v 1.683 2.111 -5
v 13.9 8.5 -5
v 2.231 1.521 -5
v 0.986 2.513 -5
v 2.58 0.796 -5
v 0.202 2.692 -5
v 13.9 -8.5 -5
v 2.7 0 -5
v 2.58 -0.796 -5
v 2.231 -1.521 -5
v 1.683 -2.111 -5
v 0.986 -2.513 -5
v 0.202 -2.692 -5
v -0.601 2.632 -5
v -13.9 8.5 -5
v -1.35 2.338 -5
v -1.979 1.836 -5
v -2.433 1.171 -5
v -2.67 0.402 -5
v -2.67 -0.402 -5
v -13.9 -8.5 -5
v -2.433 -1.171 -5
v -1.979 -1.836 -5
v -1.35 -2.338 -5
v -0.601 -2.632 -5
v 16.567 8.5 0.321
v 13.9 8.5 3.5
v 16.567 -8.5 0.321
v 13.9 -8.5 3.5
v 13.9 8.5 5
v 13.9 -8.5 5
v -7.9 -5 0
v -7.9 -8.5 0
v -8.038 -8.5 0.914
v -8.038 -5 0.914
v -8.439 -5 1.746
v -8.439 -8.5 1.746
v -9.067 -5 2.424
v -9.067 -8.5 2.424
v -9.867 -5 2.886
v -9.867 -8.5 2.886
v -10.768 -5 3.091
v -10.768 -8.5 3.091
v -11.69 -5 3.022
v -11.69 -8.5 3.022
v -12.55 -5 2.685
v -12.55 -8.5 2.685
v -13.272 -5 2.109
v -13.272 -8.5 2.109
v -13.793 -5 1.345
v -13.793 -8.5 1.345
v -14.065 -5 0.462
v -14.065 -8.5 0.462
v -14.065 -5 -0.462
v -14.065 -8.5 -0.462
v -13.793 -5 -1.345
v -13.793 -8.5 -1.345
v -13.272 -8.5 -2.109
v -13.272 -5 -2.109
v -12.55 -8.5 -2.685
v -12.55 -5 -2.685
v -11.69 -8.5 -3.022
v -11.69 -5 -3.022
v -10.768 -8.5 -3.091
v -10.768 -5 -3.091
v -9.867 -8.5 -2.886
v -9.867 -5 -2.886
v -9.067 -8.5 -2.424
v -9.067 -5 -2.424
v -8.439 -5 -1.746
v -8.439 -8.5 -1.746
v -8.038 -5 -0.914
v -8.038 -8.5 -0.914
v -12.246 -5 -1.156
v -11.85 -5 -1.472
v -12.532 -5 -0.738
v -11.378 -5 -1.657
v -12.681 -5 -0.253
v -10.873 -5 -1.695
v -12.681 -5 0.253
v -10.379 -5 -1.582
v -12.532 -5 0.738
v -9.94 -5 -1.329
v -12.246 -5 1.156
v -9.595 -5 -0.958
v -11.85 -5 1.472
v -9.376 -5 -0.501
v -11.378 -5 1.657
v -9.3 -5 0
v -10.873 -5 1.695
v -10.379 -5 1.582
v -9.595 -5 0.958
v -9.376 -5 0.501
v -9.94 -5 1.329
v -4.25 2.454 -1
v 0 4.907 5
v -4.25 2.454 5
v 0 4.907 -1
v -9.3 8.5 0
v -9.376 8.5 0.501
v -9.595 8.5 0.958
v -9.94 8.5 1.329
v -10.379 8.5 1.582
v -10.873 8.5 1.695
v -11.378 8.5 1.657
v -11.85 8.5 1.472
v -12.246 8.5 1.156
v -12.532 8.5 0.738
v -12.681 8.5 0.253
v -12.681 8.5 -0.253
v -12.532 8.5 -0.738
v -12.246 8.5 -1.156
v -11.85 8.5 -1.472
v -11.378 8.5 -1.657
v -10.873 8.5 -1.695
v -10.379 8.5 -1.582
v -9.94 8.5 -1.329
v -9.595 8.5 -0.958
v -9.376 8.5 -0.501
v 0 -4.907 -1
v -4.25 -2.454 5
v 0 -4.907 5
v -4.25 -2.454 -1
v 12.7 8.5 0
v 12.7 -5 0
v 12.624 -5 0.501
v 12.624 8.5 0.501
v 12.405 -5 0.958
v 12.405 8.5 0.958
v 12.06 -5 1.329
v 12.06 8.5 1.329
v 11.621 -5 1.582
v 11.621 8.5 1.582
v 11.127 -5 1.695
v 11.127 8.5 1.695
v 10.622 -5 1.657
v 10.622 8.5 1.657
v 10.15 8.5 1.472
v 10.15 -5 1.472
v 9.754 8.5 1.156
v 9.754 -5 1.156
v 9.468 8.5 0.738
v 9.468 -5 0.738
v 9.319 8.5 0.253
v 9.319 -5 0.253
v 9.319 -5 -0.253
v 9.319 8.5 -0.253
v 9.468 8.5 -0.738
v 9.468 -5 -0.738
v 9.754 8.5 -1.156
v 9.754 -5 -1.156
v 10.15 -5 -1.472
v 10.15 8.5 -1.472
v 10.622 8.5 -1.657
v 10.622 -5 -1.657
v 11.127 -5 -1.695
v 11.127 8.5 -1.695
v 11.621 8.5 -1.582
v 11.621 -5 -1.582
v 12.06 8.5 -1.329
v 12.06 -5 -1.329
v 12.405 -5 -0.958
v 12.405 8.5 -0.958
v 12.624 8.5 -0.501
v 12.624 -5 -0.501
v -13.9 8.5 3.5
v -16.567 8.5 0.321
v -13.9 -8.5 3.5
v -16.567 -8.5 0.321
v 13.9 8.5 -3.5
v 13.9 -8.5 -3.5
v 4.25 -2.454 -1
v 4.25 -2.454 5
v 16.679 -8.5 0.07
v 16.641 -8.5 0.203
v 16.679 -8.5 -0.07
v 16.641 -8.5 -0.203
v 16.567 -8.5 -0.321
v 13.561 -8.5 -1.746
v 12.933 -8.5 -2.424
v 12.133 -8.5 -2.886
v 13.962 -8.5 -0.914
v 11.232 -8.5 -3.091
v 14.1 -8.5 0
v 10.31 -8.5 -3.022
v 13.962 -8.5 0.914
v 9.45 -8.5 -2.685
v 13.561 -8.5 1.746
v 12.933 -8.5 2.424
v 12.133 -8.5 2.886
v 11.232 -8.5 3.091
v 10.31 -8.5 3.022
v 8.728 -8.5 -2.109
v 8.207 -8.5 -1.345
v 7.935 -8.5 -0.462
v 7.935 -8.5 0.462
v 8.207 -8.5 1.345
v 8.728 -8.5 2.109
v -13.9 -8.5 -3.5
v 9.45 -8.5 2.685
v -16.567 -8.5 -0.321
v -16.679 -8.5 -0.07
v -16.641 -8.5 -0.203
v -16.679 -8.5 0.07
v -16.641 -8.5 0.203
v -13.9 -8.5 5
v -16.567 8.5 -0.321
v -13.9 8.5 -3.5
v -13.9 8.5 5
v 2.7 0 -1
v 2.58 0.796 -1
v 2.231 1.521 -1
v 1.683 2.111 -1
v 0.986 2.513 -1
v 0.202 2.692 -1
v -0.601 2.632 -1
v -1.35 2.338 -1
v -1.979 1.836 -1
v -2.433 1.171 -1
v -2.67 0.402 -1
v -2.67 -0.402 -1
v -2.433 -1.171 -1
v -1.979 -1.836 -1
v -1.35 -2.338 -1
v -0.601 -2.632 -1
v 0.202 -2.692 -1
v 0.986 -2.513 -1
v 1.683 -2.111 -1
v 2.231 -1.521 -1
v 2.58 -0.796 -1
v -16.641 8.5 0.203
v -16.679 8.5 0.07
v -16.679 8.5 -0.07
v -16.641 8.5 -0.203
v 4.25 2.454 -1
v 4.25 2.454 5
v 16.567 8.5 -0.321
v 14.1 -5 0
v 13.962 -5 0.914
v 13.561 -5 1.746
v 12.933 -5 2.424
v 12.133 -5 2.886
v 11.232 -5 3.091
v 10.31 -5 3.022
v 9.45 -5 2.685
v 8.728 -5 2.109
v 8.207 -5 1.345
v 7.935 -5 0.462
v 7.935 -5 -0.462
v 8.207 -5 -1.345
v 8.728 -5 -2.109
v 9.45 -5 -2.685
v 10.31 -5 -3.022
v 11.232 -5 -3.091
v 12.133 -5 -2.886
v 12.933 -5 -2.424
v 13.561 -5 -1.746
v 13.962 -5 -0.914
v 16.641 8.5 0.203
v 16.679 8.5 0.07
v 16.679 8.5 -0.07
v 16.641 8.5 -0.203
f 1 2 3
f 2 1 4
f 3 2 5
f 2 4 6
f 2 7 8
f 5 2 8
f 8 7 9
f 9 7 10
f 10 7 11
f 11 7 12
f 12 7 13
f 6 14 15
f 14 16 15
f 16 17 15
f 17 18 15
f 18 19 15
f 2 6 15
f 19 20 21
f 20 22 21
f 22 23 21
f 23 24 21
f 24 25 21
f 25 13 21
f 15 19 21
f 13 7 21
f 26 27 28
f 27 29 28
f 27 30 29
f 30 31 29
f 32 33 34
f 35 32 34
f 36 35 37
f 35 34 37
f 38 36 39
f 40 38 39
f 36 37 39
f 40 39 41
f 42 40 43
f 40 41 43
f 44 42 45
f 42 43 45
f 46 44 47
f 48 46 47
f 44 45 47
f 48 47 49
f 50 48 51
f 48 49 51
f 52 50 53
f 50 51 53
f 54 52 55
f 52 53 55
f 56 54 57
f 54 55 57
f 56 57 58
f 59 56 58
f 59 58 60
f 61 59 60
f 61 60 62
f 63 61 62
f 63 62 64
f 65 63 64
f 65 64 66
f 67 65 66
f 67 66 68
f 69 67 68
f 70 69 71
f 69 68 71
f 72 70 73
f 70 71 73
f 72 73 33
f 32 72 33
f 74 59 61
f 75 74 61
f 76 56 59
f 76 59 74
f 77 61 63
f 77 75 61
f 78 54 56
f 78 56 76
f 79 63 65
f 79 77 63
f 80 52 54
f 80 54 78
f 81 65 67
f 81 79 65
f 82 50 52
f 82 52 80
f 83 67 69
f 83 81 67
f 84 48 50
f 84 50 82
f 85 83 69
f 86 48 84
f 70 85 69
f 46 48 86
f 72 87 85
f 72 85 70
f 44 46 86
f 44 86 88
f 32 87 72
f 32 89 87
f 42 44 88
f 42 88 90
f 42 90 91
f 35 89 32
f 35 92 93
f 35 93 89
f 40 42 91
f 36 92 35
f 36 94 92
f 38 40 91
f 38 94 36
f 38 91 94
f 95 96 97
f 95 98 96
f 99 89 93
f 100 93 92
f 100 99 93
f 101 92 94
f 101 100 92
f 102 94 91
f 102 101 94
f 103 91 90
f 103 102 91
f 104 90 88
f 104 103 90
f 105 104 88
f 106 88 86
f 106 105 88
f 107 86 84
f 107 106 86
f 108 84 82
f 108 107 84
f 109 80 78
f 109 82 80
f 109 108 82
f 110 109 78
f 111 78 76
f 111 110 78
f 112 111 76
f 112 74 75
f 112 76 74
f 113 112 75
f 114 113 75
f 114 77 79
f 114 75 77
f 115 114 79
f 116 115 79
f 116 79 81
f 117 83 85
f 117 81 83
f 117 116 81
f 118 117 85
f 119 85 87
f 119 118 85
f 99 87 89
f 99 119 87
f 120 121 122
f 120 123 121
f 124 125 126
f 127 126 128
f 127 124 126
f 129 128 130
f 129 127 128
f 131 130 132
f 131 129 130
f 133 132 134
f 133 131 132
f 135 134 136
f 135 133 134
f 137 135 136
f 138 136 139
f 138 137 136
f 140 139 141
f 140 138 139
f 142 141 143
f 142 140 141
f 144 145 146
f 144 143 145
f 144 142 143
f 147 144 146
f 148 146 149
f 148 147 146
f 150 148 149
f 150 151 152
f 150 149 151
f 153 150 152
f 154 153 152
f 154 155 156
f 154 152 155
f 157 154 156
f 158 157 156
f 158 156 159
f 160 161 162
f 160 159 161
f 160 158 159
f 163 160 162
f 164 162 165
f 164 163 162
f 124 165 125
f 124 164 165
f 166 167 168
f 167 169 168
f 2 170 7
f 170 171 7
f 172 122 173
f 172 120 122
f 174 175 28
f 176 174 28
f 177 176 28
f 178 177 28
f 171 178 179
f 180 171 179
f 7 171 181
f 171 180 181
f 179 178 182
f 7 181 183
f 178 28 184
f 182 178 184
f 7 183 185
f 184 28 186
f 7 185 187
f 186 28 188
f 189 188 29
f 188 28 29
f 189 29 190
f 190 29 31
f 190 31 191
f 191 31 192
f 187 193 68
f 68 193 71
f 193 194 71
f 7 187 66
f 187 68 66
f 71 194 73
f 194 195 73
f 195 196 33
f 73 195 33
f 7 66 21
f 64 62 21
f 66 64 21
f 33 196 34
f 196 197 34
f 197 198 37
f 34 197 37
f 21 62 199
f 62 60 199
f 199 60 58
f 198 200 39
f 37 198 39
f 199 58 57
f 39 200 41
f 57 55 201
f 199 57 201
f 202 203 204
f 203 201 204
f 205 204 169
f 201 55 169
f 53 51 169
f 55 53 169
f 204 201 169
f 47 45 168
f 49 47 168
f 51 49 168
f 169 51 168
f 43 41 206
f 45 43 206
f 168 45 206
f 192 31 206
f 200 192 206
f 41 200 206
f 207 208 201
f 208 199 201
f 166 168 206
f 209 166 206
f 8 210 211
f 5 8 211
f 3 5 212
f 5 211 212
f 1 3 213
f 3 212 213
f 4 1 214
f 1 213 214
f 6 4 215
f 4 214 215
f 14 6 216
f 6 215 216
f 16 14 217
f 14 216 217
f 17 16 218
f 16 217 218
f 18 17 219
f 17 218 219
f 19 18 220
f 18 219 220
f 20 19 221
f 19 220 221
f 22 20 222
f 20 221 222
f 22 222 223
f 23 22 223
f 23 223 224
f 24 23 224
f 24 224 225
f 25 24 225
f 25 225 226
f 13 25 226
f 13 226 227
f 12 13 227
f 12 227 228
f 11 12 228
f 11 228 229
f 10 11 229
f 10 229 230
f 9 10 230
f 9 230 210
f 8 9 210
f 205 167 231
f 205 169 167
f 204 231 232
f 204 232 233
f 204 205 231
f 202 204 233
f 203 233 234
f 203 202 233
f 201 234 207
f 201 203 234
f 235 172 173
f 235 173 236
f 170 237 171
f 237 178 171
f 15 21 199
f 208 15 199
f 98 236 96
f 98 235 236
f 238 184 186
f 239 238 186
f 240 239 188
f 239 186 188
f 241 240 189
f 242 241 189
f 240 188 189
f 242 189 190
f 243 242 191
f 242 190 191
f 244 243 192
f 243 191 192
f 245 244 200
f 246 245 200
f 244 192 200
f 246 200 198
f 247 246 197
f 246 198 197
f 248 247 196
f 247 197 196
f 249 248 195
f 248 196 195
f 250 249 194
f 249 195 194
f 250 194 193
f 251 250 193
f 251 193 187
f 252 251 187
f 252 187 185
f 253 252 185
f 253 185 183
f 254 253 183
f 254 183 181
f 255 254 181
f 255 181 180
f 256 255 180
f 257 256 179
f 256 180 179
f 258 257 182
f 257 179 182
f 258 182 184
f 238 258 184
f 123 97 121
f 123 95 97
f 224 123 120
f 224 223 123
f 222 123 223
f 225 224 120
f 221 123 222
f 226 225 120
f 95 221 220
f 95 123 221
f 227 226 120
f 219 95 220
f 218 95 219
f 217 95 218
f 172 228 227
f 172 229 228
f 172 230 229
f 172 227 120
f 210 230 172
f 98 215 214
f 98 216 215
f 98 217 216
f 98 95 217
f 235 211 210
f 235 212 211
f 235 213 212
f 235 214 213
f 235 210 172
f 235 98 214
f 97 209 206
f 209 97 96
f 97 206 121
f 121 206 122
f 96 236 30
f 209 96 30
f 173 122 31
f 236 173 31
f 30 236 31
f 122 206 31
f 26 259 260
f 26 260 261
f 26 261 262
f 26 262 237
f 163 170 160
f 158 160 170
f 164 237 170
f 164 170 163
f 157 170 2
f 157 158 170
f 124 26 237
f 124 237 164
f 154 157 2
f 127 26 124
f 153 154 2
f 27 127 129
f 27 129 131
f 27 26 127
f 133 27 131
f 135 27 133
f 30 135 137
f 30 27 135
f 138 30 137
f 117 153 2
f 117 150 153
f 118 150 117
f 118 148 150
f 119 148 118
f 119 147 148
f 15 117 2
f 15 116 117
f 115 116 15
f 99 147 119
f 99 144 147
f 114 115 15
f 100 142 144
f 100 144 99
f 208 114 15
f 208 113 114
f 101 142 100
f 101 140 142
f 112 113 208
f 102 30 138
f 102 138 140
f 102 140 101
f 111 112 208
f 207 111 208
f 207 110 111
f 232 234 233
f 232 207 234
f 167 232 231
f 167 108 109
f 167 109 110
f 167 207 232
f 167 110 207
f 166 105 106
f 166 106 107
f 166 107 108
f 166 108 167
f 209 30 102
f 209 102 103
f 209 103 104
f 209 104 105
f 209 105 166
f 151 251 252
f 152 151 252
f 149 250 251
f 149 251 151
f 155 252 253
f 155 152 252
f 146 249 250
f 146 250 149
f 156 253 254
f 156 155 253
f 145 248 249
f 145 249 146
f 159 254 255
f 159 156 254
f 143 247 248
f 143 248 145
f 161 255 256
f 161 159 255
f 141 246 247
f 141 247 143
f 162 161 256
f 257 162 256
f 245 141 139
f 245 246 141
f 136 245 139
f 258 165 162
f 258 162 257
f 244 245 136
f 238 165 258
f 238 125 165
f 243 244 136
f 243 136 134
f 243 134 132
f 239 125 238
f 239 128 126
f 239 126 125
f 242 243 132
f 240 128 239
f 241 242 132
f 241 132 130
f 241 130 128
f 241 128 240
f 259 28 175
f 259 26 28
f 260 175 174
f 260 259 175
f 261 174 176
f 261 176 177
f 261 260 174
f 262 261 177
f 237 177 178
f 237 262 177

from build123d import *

# Parameters (mm, degrees)
SKETCH_R             = 1.7
PAD_DEPTH            = 8.5
SKETCH002_R          = 3.1
POCKET_DEPTH         = 3.5
POCKET001_DEPTH      = 1
POCKET001_DEPTH_BACK = -5
SKETCH004_R          = 2.7
POCKET002_DEPTH      = 5.001
FILLET_R             = 0.5


with BuildPart() as part:
    # Sketch → Pad (new body, symmetric)
    with BuildSketch(Plane.XZ):
        Polygon((-13.9, 5), (13.9, 5), (13.9, 3.5), (16.836849, 0), (13.9, -3.5), (13.9, -5), (-13.9, -5), (-13.9, -3.5), (-16.836849, 0), (-13.9, 3.5), align=None)
        with Locations((-11, 0)):
            Circle(SKETCH_R, mode=Mode.SUBTRACT)
        with Locations((11, 0)):
            Circle(SKETCH_R, mode=Mode.SUBTRACT)
    extrude(amount=PAD_DEPTH, both=True)

    # Sketch002 (on DatumPlane) → Pocket (cut)
    with BuildSketch(Plane.XZ.offset(8.5)):
        with Locations((-11, 0)):
            Circle(SKETCH002_R)
        with Locations((11, 0)):
            Circle(SKETCH002_R)
    extrude(amount=-POCKET_DEPTH, mode=Mode.SUBTRACT)

    # Sketch003 → Pocket001 (cut, two sides)
    with BuildSketch(Plane.XY) as pocket001_sk:
        Polygon((4.25, -2.453739), (4.25, 2.453739), (0, 4.907477), (-4.25, 2.453739), (-4.25, -2.453739), (0, -4.907477), align=None)
    extrude(amount=-POCKET001_DEPTH, mode=Mode.SUBTRACT)
    extrude(pocket001_sk.sketch, amount=-POCKET001_DEPTH_BACK, mode=Mode.SUBTRACT)

    # Sketch004 → Pocket002 (cut, through all)
    with BuildSketch(Plane.XY):
        Circle(SKETCH004_R)
    extrude(amount=-POCKET002_DEPTH, mode=Mode.SUBTRACT)

    # Fillet
    fillet_edges = [part.edges().sort_by_distance(p)[0] for p in [
        (16.836849, 0, 0),
        (-16.836849, 0, 0),
    ]]
    fillet(fillet_edges, radius=FILLET_R)


solid = part.part
